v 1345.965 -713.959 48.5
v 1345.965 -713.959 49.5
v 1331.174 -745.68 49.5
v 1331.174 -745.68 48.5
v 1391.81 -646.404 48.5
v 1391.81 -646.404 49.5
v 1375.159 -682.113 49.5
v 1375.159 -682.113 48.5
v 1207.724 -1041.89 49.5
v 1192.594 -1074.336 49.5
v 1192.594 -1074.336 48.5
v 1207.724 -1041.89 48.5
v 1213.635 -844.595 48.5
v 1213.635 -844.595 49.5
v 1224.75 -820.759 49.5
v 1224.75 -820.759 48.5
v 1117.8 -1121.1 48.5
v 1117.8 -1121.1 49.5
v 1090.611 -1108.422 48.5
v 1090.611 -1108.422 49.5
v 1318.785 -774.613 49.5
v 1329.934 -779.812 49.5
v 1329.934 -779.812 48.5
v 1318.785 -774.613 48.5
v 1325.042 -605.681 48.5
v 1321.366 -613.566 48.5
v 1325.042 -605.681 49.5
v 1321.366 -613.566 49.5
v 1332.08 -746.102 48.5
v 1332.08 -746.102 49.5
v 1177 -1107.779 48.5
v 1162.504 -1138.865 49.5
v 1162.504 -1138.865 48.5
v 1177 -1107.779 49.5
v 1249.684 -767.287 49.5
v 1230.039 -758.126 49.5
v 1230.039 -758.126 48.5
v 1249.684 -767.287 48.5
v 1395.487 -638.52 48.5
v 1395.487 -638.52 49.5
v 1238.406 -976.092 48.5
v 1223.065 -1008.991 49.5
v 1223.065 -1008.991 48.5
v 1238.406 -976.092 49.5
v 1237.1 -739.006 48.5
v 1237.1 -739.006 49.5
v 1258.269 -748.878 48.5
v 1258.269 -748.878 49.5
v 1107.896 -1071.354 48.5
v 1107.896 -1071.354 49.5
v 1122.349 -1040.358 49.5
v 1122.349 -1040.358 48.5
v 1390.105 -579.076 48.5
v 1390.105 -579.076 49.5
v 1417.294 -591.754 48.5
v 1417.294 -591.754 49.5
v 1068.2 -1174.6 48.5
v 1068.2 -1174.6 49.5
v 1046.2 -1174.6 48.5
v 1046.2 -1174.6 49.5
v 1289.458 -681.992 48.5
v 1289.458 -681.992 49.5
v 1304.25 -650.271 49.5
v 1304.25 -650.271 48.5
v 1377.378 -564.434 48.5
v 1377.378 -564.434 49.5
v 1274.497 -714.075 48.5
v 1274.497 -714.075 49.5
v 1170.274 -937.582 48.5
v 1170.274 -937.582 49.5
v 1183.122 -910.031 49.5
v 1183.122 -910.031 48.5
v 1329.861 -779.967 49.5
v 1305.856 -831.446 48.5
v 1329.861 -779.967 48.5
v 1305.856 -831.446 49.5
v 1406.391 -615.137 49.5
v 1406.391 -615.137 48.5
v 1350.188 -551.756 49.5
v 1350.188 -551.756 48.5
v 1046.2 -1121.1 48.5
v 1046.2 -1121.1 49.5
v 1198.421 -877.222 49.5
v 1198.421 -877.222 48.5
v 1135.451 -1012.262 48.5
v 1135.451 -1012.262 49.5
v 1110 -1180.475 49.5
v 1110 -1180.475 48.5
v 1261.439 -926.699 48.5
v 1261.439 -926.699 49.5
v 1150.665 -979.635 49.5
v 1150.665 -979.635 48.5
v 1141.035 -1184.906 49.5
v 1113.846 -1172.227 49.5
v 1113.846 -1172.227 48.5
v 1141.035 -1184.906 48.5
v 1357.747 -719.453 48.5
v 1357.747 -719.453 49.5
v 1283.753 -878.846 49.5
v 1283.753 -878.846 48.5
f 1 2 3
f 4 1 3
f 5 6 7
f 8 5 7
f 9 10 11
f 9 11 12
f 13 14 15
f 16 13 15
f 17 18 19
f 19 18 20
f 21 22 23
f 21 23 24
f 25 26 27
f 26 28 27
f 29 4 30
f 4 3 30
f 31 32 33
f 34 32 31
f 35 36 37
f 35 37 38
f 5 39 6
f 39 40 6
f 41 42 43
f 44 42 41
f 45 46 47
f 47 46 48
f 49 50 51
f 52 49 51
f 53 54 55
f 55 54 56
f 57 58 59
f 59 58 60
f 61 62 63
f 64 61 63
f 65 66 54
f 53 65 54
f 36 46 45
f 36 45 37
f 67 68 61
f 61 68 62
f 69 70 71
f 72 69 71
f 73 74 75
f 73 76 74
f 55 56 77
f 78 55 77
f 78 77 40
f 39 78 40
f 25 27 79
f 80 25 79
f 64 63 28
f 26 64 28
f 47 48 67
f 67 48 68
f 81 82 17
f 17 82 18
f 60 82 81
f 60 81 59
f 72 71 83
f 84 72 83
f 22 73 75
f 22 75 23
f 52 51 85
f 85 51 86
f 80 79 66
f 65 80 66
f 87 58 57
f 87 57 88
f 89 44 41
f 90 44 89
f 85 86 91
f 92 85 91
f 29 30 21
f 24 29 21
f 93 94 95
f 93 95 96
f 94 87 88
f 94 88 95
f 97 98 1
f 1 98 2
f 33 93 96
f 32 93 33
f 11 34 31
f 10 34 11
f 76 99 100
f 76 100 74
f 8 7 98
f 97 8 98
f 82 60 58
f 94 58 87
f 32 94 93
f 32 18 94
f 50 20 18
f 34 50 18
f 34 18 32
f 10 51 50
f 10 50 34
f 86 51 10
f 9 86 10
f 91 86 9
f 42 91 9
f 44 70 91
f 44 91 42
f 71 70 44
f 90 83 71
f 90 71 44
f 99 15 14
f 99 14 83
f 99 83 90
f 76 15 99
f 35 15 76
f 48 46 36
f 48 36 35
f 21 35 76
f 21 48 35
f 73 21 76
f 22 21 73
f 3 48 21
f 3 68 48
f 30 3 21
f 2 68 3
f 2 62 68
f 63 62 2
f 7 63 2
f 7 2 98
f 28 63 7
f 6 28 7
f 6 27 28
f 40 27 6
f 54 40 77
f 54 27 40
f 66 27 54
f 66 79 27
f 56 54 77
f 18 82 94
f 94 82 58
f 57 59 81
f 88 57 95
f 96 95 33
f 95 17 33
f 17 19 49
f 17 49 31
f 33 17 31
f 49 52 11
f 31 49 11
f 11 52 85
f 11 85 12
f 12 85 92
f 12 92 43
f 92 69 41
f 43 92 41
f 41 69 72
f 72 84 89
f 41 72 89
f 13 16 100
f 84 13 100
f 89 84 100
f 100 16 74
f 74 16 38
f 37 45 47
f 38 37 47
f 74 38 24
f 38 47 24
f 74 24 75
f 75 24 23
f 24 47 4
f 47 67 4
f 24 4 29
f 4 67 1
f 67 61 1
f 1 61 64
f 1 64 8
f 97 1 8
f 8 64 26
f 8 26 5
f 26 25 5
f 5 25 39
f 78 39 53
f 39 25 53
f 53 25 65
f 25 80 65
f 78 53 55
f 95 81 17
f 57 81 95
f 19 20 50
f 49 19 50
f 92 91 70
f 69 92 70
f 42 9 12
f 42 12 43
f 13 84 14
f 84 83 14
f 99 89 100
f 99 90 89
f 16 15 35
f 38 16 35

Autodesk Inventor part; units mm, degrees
ref_plane "YZ Plane" through (0, 0, 0) normal (1, 0, 0) x (0, 1, 0)
ref_plane "XZ Plane" through (0, 0, 0) normal (0, 1, 0) x (-1, 0, 0)
ref_plane "工作平面1" through (0, 0, 49.5) normal (0, 0, 1) x (1, 0, 0)
sketch "草图1" plane through (0, 0, 49.5) normal (0, 0, 1) x (1, 0, 0)
  line L0 (849.2, -1174.6) -> (1031.2, -1174.6)
  line L1 (1031.2, -1121.1) -> (909.2, -1121.1)
  line L2 (1031.2, -1121.1) -> (1031.2, -1174.6)
  line L3 (916.2, -626.6) -> (1226.4, -727) construction
  arc A0 (1226.4, -727) -> (916.2, -626.6) centre (761.993, -1632.4479) ccw
  line L4 (916.2, -664.6) -> (1213.4, -757.7) construction
  arc A1 (1213.4, -757.7) -> (916.2, -664.6) centre (605.6007, -2177.0365) ccw
  line L5 (1226.4, -727) -> (1213.4, -757.7)
  line L6 (1226.4, -727) -> (1239.7468, -733.8456)
  line L7 (1213.4, -757.7) -> (1226.7468, -764.5456)
  line L8 (1239.7468, -733.8456) -> (1237.0998, -739.0064)
  line L9 (1226.7468, -764.5456) -> (1230.0392, -758.1265)
  line L10 (1031.2, -1121.1) -> (1046.2, -1121.1)
  line L11 (1046.2, -1121.1) -> (1046.2, -1174.6)
  line L12 (1046.2, -1174.6) -> (1031.2, -1174.6)
  line L13 (1046.2, -1121.1) -> (1068.2, -1121.1)
  line L14 (1068.2, -1174.6) -> (1046.2, -1174.6)
  line L15 (1068.2, -1121.1) -> (1068.2, -1139.5)
  line L16 (1068.2, -1174.6) -> (1068.2, -1156.2)
  line L17 (1068.2, -1174.6) -> (1110, -1180.4746)
  line L18 (1068.2, -1121.1) -> (1117.8, -1121.1)
  line L19 (1110, -1180.4746) -> (1113.8458, -1172.2272)
  line L20 (1113.8458, -1172.2272) -> (1141.0351, -1184.9058)
  line L21 (1141.0351, -1184.9058) -> (1162.5041, -1138.8653)
  line L22 (1162.5041, -1138.8653) -> (1176.9999, -1107.779)
  line L23 (1176.9999, -1107.779) -> (1192.5945, -1074.3362)
  line L24 (1192.5945, -1074.3362) -> (1207.7242, -1041.8904)
  line L25 (1207.7242, -1041.8904) -> (1223.0653, -1008.9914)
  line L26 (1223.0653, -1008.9914) -> (1238.4063, -976.0924)
  line L27 (1238.4063, -976.0924) -> (1261.439, -926.6987)
  line L28 (1261.439, -926.6987) -> (1283.7532, -878.8456)
  line L29 (1283.7532, -878.8456) -> (1305.8562, -831.4457)
  line L30 (1305.8562, -831.4457) -> (1329.8609, -779.9674)
  line L31 (1117.8, -1121.1) -> (1090.6108, -1108.4215)
  line L32 (1090.6108, -1108.4215) -> (1107.8959, -1071.3535)
  line L33 (1107.8959, -1071.3535) -> (1122.3494, -1040.3577)
  line L34 (1122.3494, -1040.3577) -> (1135.4506, -1012.2622)
  line L35 (1135.4506, -1012.2622) -> (1150.6648, -979.6351)
  line L36 (1150.6648, -979.6351) -> (1170.2743, -937.5824)
  line L37 (1170.2743, -937.5824) -> (1183.1219, -910.0307)
  line L38 (1183.1219, -910.0307) -> (1198.4207, -877.2223)
  line L39 (1198.4207, -877.2223) -> (1213.6349, -844.5953)
  line L40 (1213.6349, -844.5953) -> (1224.7498, -820.7594)
  line L41 (1224.7498, -820.7594) -> (1249.6843, -767.2872)
  line L42 (1230.0392, -758.1265) -> (1277.1672, -780.1027)
  line L43 (1237.0998, -739.0064) -> (1285.7517, -761.6931)
  line L44 (1277.1672, -780.1027) -> (1285.7517, -761.6931) construction
  line L45 (1249.6843, -767.2872) -> (1258.2688, -748.8776) construction
  line L46 (1258.2688, -748.8776) -> (1274.4973, -714.0754)
  line L47 (1274.4973, -714.0754) -> (1289.458, -681.9921)
  line L48 (1289.458, -681.9921) -> (1304.2497, -650.2714)
  line L49 (1304.2497, -650.2714) -> (1321.3657, -613.5659)
  line L50 (1321.3657, -613.5659) -> (1325.0425, -605.681)
  line L51 (1325.0425, -605.681) -> (1350.1883, -551.7557)
  line L52 (1350.1883, -551.7557) -> (1377.3775, -564.4342)
  line L53 (1377.3775, -564.4342) -> (1390.1051, -579.0756)
  line L54 (1390.1051, -579.0756) -> (1417.2943, -591.7542)
  line L55 (1377.3775, -564.4342) -> (1350.1883, -551.7557)
  line L56 (1350.1883, -551.7557) -> (1325.0425, -605.681)
  line L57 (1325.0425, -605.681) -> (1352.2317, -618.3596)
  line L58 (1352.2317, -618.3596) -> (1377.3775, -564.4342)
  line L59 (1352.2317, -618.3596) -> (1325.0425, -605.681)
  line L60 (1325.0425, -605.681) -> (1304.2497, -650.2714)
  line L61 (1304.2497, -650.2714) -> (1331.4389, -662.9499)
  line L62 (1331.4389, -662.9499) -> (1352.2317, -618.3596)
  line L63 (1331.4389, -662.9499) -> (1304.2497, -650.2714)
  line L64 (1304.2497, -650.2714) -> (1289.458, -681.9921)
  line L65 (1289.458, -681.9921) -> (1316.6473, -694.6707)
  line L66 (1316.6473, -694.6707) -> (1331.4389, -662.9499)
  line L67 (1316.6473, -694.6707) -> (1289.458, -681.9921)
  line L68 (1289.458, -681.9921) -> (1274.4973, -714.0754)
  line L69 (1274.4973, -714.0754) -> (1301.6866, -726.754)
  line L70 (1301.6866, -726.754) -> (1316.6473, -694.6707)
  line L71 (1301.6866, -726.754) -> (1274.4973, -714.0754)
  line L72 (1274.4973, -714.0754) -> (1258.2688, -748.8776)
  line L73 (1258.2688, -748.8776) -> (1285.458, -761.5562)
  line L74 (1285.458, -761.5562) -> (1301.6866, -726.754)
  line L75 (1417.2943, -591.7542) -> (1406.3907, -615.1369)
  line L76 (1406.3907, -615.1369) -> (1395.4872, -638.5196)
  line L77 (1395.4872, -638.5196) -> (1391.8104, -646.4045)
  line L78 (1391.8104, -646.4045) -> (1375.1592, -682.113)
  line L79 (1375.1592, -682.113) -> (1357.7474, -719.4529)
  line L80 (1390.1051, -579.0756) -> (1417.2943, -591.7542)
  line L81 (1417.2943, -591.7542) -> (1406.3907, -615.1369)
  line L82 (1406.3907, -615.1369) -> (1379.2015, -602.4583)
  line L83 (1379.2015, -602.4583) -> (1390.1051, -579.0756)
  line L84 (1379.2015, -602.4583) -> (1406.3907, -615.1369)
  line L85 (1406.3907, -615.1369) -> (1395.4872, -638.5196)
  line L86 (1395.4872, -638.5196) -> (1368.2979, -625.8411)
  line L87 (1368.2979, -625.8411) -> (1379.2015, -602.4583)
  line L88 (1368.2979, -625.8411) -> (1395.4872, -638.5196)
  line L89 (1395.4872, -638.5196) -> (1391.8104, -646.4045)
  line L90 (1391.8104, -646.4045) -> (1364.6212, -633.726)
  line L91 (1364.6212, -633.726) -> (1368.2979, -625.8411)
  line L92 (1364.6212, -633.726) -> (1391.8104, -646.4045)
  line L93 (1391.8104, -646.4045) -> (1375.1592, -682.113)
  line L94 (1375.1592, -682.113) -> (1347.97, -669.4345)
  line L95 (1347.97, -669.4345) -> (1364.6212, -633.726)
  line L96 (1347.97, -669.4345) -> (1375.1592, -682.113)
  line L97 (1375.1592, -682.113) -> (1357.7474, -719.4529)
  line L98 (1357.7474, -719.4529) -> (1330.5581, -706.7744)
  line L99 (1330.5581, -706.7744) -> (1347.97, -669.4345)
  line L100 (1330.5581, -706.7744) -> (1345.9654, -713.9589)
  line L101 (1345.9654, -713.9589) -> (1331.1737, -745.6797)
  line L102 (1331.1737, -745.6797) -> (1315.7665, -738.4951)
  line L103 (1315.7665, -738.4951) -> (1330.5581, -706.7744)
  line L104 (1113.8458, -1172.2272) -> (1141.0351, -1184.9058)
  line L105 (1141.0351, -1184.9058) -> (1162.5041, -1138.8653)
  line L106 (1162.5041, -1138.8653) -> (1135.3148, -1126.1868)
  line L107 (1135.3148, -1126.1868) -> (1113.8458, -1172.2272)
  line L108 (1135.3148, -1126.1868) -> (1162.5041, -1138.8653)
  line L109 (1162.5041, -1138.8653) -> (1176.9999, -1107.779)
  line L110 (1176.9999, -1107.779) -> (1149.8106, -1095.1004)
  line L111 (1149.8106, -1095.1004) -> (1135.3148, -1126.1868)
  line L112 (1149.8106, -1095.1004) -> (1176.9999, -1107.779)
  line L113 (1176.9999, -1107.779) -> (1192.5945, -1074.3362)
  line L114 (1192.5945, -1074.3362) -> (1165.4053, -1061.6577)
  line L115 (1165.4053, -1061.6577) -> (1149.8106, -1095.1004)
  line L116 (1165.4053, -1061.6577) -> (1192.5945, -1074.3362)
  line L117 (1192.5945, -1074.3362) -> (1207.7242, -1041.8904)
  line L118 (1207.7242, -1041.8904) -> (1180.535, -1029.2118)
  line L119 (1180.535, -1029.2118) -> (1165.4053, -1061.6577)
  line L120 (1180.535, -1029.2118) -> (1207.7242, -1041.8904)
  line L121 (1207.7242, -1041.8904) -> (1223.0653, -1008.9914)
  line L122 (1223.0653, -1008.9914) -> (1195.876, -996.3129)
  line L123 (1195.876, -996.3129) -> (1180.535, -1029.2118)
  line L124 (1195.876, -996.3129) -> (1223.0653, -1008.9914)
  line L125 (1223.0653, -1008.9914) -> (1238.4063, -976.0924)
  line L126 (1238.4063, -976.0924) -> (1211.2171, -963.4139)
  line L127 (1211.2171, -963.4139) -> (1195.876, -996.3129)
  line L128 (1211.2171, -963.4139) -> (1238.4063, -976.0924)
  line L129 (1238.4063, -976.0924) -> (1261.439, -926.6987)
  line L130 (1261.439, -926.6987) -> (1234.2498, -914.0201)
  line L131 (1234.2498, -914.0201) -> (1211.2171, -963.4139)
  line L132 (1234.2498, -914.0201) -> (1261.439, -926.6987)
  line L133 (1261.439, -926.6987) -> (1283.7532, -878.8456)
  line L134 (1283.7532, -878.8456) -> (1256.564, -866.1671)
  line L135 (1256.564, -866.1671) -> (1234.2498, -914.0201)
  line L136 (1256.564, -866.1671) -> (1283.7532, -878.8456)
  line L137 (1283.7532, -878.8456) -> (1305.8562, -831.4457)
  line L138 (1305.8562, -831.4457) -> (1278.6669, -818.7672)
  line L139 (1278.6669, -818.7672) -> (1256.564, -866.1671)
  line L140 (1278.6669, -818.7672) -> (1305.8562, -831.4457)
  line L141 (1305.8562, -831.4457) -> (1329.9336, -779.8115)
  line L142 (1329.9336, -779.8115) -> (1302.7444, -767.1329)
  line L143 (1302.7444, -767.1329) -> (1278.6669, -818.7672)
  line L144 (1117.8, -1121.1) -> (1090.6108, -1108.4215)
  line L145 (1090.6108, -1108.4215) -> (1107.8959, -1071.3535)
  line L146 (1107.8959, -1071.3535) -> (1135.0851, -1084.032)
  line L147 (1135.0851, -1084.032) -> (1117.8, -1121.1)
  line L148 (1135.0851, -1084.032) -> (1107.8959, -1071.3535)
  line L149 (1107.8959, -1071.3535) -> (1122.3494, -1040.3577)
  line L150 (1122.3494, -1040.3577) -> (1149.5386, -1053.0363)
  line L151 (1149.5386, -1053.0363) -> (1135.0851, -1084.032)
  line L152 (1149.5386, -1053.0363) -> (1122.3494, -1040.3577)
  line L153 (1122.3494, -1040.3577) -> (1135.4506, -1012.2622)
  line L154 (1135.4506, -1012.2622) -> (1162.6398, -1024.9407)
  line L155 (1162.6398, -1024.9407) -> (1149.5386, -1053.0363)
  line L156 (1162.6398, -1024.9407) -> (1135.4506, -1012.2622)
  line L157 (1135.4506, -1012.2622) -> (1150.6648, -979.6351)
  line L158 (1150.6648, -979.6351) -> (1177.8541, -992.3137)
  line L159 (1177.8541, -992.3137) -> (1162.6398, -1024.9407)
  line L160 (1177.8541, -992.3137) -> (1150.6648, -979.6351)
  line L161 (1150.6648, -979.6351) -> (1170.2743, -937.5824)
  line L162 (1170.2743, -937.5824) -> (1197.4635, -950.261)
  line L163 (1197.4635, -950.261) -> (1177.8541, -992.3137)
  line L164 (1197.4635, -950.261) -> (1170.2743, -937.5824)
  line L165 (1170.2743, -937.5824) -> (1183.1219, -910.0307)
  line L166 (1183.1219, -910.0307) -> (1210.3111, -922.7092)
  line L167 (1210.3111, -922.7092) -> (1197.4635, -950.261)
  line L168 (1210.3111, -922.7092) -> (1183.1219, -910.0307)
  line L169 (1183.1219, -910.0307) -> (1198.4207, -877.2223)
  line L170 (1198.4207, -877.2223) -> (1225.6099, -889.9009)
  line L171 (1225.6099, -889.9009) -> (1210.3111, -922.7092)
  line L172 (1225.6099, -889.9009) -> (1198.4207, -877.2223)
  line L173 (1198.4207, -877.2223) -> (1213.6349, -844.5953)
  line L174 (1213.6349, -844.5953) -> (1240.8242, -857.2738)
  line L175 (1240.8242, -857.2738) -> (1225.6099, -889.9009)
  line L176 (1240.8242, -857.2738) -> (1213.6349, -844.5953)
  line L177 (1213.6349, -844.5953) -> (1224.7498, -820.7594)
  line L178 (1224.7498, -820.7594) -> (1251.939, -833.4379)
  line L179 (1251.939, -833.4379) -> (1240.8242, -857.2738)
  line L180 (1251.939, -833.4379) -> (1224.7498, -820.7594)
  line L181 (1224.7498, -820.7594) -> (1249.6843, -767.2872)
  line L182 (1249.6843, -767.2872) -> (1276.8735, -779.9657)
  line L183 (1276.8735, -779.9657) -> (1251.939, -833.4379)
  line L184 (1331.1737, -745.6797) -> (1332.08, -746.1023)
  line L185 (1332.08, -746.1023) -> (1318.7853, -774.6129)
  line L186 (1302.7444, -767.1329) -> (1315.7665, -738.4951) construction
  line L187 (1237.0998, -739.0064) -> (1230.0618, -758.0824)
  point P0 (0, 0)
  dimension "d122" = 182
  dimension "d123" = 100.4
  dimension "d124" = 310.2
  dimension "d125" = 1017.6
  dimension "d126" = 93.1
  dimension "d127" = 297.2
  dimension "d128" = 1544
  dimension "d129" = 15
  dimension "d130" = 15
  dimension "d131" = 5.8
  dimension "d133" = 15
  dimension "d134" = 22
  dimension "d135" = 18.4
  dimension "d136" = 18.4
  dimension "d137" = 172
  dimension "d138" = 41.8
  dimension "d139" = 49.6
  dimension "d140" = 107
  dimension "d141" = 9.1
  dimension "d142" = 30
  dimension "d143" = 50.8
  dimension "d144" = 34.3
  dimension "d145" = 36.9
  dimension "d146" = 35.8
  dimension "d147" = 36.3
  dimension "d148" = 36.3
  dimension "d149" = 54.5
  dimension "d150" = 52.8
  dimension "d151" = 52.3
  dimension "d152" = 56.8
  dimension "d153" = 30
  dimension "d154" = 40.9
  dimension "d155" = 34.2
  dimension "d156" = 31
  dimension "d157" = 36
  dimension "d158" = 46.4
  dimension "d159" = 30.4
  dimension "d160" = 36.2
  dimension "d161" = 36
  dimension "d162" = 26.3
  dimension "d163" = 59
  dimension "d164" = 52
  dimension "d165" = 38.4
  dimension "d166" = 35.4
  dimension "d167" = 35
  dimension "d168" = 40.5
  dimension "d169" = 8.7
  dimension "d170" = 59.5
  dimension "d171" = 30
  dimension "d172" = 156
  dimension "d173" = 19.4
  dimension "d174" = 30
  dimension "d175" = 25.8
  dimension "d176" = 25.8
  dimension "d177" = 8.7
  dimension "d178" = 39.4
  dimension "d179" = 41.2
  dimension "d180" = 17
  dimension "d181" = 35
  dimension "d183" = 1
  dimension "d184" = 0.548
  dimension "d185" = 87.95
  dimension "d186" = 25
  dimension "d187" = 25
extrude "拉伸1" add sketch "草图1" against normal blind 1 contours L13 L18 L147 L151 L155 L159 L163 L167 L171 L175 L179 L183 L42 L9 L7 L5 L6 L8 L43 L74 L70 L66 L62 L58 L53 L83 L87 L91 L95 L99 L103 L102 L184 L185 L142 L143 L139 L135 L131 L127 L123 L119 L115 L111 L107 L19 L17 L14 L11 | L31 L32 L146 L147 | L146 L33 L150 L151 | L107 L106 L21 L20 | L150 L34 L154 L155 | L111 L110 L22 L106 | L154 L35 L158 L159 | L115 L114 L23 L110 | L158 L36 L162 L163 | L119 L118 L24 L114 | L162 L37 L166 L167 | L123 L122 L25 L118 | L166 L38 L170 L171 | L127 L126 L26 L122 | L170 L39 L174 L175 | L131 L130 L27 L126 | L174 L40 L178 L179 | L135 L134 L28 L130 | L178 L41 L42 L183 | L139 L138 L29 L134 | L143 L142 L141 L30 L138 | L102 L103 L98 L101 | L98 L99 L94 L79 | L94 L95 L90 L78 | L46 L69 L74 L43 | L90 L91 L86 L77 | L47 L65 L70 L69 | L86 L87 L82 L76 | L48 L61 L66 L65 | L82 L83 L54 L75 | L49 L50 L57 L62 L61 | L58 L57 L51 L52
sketch "草图2" plane through (0, 0, 49.5) normal (0, 0, 1) x (1, 0, 0)
  line L0 (1239.7468, -733.8456) -> (1226.4, -727) projected
  line L1 (1226.4, -727) -> (1213.4, -757.7) projected
  line L2 (1237.0998, -739.0064) -> (1239.7468, -733.8456) projected
  line L3 (1226.7468, -764.5456) -> (1230.0392, -758.1265) projected
  line L4 (1213.4, -757.7) -> (1226.7468, -764.5456) projected
  line L5 (1237.0998, -739.0064) -> (1230.0392, -758.1265)
  point P0 (0, 0)
extrude "拉伸2" cut sketch "草图2" against normal blind 2
properties part number "LabVIEWM0.5"
